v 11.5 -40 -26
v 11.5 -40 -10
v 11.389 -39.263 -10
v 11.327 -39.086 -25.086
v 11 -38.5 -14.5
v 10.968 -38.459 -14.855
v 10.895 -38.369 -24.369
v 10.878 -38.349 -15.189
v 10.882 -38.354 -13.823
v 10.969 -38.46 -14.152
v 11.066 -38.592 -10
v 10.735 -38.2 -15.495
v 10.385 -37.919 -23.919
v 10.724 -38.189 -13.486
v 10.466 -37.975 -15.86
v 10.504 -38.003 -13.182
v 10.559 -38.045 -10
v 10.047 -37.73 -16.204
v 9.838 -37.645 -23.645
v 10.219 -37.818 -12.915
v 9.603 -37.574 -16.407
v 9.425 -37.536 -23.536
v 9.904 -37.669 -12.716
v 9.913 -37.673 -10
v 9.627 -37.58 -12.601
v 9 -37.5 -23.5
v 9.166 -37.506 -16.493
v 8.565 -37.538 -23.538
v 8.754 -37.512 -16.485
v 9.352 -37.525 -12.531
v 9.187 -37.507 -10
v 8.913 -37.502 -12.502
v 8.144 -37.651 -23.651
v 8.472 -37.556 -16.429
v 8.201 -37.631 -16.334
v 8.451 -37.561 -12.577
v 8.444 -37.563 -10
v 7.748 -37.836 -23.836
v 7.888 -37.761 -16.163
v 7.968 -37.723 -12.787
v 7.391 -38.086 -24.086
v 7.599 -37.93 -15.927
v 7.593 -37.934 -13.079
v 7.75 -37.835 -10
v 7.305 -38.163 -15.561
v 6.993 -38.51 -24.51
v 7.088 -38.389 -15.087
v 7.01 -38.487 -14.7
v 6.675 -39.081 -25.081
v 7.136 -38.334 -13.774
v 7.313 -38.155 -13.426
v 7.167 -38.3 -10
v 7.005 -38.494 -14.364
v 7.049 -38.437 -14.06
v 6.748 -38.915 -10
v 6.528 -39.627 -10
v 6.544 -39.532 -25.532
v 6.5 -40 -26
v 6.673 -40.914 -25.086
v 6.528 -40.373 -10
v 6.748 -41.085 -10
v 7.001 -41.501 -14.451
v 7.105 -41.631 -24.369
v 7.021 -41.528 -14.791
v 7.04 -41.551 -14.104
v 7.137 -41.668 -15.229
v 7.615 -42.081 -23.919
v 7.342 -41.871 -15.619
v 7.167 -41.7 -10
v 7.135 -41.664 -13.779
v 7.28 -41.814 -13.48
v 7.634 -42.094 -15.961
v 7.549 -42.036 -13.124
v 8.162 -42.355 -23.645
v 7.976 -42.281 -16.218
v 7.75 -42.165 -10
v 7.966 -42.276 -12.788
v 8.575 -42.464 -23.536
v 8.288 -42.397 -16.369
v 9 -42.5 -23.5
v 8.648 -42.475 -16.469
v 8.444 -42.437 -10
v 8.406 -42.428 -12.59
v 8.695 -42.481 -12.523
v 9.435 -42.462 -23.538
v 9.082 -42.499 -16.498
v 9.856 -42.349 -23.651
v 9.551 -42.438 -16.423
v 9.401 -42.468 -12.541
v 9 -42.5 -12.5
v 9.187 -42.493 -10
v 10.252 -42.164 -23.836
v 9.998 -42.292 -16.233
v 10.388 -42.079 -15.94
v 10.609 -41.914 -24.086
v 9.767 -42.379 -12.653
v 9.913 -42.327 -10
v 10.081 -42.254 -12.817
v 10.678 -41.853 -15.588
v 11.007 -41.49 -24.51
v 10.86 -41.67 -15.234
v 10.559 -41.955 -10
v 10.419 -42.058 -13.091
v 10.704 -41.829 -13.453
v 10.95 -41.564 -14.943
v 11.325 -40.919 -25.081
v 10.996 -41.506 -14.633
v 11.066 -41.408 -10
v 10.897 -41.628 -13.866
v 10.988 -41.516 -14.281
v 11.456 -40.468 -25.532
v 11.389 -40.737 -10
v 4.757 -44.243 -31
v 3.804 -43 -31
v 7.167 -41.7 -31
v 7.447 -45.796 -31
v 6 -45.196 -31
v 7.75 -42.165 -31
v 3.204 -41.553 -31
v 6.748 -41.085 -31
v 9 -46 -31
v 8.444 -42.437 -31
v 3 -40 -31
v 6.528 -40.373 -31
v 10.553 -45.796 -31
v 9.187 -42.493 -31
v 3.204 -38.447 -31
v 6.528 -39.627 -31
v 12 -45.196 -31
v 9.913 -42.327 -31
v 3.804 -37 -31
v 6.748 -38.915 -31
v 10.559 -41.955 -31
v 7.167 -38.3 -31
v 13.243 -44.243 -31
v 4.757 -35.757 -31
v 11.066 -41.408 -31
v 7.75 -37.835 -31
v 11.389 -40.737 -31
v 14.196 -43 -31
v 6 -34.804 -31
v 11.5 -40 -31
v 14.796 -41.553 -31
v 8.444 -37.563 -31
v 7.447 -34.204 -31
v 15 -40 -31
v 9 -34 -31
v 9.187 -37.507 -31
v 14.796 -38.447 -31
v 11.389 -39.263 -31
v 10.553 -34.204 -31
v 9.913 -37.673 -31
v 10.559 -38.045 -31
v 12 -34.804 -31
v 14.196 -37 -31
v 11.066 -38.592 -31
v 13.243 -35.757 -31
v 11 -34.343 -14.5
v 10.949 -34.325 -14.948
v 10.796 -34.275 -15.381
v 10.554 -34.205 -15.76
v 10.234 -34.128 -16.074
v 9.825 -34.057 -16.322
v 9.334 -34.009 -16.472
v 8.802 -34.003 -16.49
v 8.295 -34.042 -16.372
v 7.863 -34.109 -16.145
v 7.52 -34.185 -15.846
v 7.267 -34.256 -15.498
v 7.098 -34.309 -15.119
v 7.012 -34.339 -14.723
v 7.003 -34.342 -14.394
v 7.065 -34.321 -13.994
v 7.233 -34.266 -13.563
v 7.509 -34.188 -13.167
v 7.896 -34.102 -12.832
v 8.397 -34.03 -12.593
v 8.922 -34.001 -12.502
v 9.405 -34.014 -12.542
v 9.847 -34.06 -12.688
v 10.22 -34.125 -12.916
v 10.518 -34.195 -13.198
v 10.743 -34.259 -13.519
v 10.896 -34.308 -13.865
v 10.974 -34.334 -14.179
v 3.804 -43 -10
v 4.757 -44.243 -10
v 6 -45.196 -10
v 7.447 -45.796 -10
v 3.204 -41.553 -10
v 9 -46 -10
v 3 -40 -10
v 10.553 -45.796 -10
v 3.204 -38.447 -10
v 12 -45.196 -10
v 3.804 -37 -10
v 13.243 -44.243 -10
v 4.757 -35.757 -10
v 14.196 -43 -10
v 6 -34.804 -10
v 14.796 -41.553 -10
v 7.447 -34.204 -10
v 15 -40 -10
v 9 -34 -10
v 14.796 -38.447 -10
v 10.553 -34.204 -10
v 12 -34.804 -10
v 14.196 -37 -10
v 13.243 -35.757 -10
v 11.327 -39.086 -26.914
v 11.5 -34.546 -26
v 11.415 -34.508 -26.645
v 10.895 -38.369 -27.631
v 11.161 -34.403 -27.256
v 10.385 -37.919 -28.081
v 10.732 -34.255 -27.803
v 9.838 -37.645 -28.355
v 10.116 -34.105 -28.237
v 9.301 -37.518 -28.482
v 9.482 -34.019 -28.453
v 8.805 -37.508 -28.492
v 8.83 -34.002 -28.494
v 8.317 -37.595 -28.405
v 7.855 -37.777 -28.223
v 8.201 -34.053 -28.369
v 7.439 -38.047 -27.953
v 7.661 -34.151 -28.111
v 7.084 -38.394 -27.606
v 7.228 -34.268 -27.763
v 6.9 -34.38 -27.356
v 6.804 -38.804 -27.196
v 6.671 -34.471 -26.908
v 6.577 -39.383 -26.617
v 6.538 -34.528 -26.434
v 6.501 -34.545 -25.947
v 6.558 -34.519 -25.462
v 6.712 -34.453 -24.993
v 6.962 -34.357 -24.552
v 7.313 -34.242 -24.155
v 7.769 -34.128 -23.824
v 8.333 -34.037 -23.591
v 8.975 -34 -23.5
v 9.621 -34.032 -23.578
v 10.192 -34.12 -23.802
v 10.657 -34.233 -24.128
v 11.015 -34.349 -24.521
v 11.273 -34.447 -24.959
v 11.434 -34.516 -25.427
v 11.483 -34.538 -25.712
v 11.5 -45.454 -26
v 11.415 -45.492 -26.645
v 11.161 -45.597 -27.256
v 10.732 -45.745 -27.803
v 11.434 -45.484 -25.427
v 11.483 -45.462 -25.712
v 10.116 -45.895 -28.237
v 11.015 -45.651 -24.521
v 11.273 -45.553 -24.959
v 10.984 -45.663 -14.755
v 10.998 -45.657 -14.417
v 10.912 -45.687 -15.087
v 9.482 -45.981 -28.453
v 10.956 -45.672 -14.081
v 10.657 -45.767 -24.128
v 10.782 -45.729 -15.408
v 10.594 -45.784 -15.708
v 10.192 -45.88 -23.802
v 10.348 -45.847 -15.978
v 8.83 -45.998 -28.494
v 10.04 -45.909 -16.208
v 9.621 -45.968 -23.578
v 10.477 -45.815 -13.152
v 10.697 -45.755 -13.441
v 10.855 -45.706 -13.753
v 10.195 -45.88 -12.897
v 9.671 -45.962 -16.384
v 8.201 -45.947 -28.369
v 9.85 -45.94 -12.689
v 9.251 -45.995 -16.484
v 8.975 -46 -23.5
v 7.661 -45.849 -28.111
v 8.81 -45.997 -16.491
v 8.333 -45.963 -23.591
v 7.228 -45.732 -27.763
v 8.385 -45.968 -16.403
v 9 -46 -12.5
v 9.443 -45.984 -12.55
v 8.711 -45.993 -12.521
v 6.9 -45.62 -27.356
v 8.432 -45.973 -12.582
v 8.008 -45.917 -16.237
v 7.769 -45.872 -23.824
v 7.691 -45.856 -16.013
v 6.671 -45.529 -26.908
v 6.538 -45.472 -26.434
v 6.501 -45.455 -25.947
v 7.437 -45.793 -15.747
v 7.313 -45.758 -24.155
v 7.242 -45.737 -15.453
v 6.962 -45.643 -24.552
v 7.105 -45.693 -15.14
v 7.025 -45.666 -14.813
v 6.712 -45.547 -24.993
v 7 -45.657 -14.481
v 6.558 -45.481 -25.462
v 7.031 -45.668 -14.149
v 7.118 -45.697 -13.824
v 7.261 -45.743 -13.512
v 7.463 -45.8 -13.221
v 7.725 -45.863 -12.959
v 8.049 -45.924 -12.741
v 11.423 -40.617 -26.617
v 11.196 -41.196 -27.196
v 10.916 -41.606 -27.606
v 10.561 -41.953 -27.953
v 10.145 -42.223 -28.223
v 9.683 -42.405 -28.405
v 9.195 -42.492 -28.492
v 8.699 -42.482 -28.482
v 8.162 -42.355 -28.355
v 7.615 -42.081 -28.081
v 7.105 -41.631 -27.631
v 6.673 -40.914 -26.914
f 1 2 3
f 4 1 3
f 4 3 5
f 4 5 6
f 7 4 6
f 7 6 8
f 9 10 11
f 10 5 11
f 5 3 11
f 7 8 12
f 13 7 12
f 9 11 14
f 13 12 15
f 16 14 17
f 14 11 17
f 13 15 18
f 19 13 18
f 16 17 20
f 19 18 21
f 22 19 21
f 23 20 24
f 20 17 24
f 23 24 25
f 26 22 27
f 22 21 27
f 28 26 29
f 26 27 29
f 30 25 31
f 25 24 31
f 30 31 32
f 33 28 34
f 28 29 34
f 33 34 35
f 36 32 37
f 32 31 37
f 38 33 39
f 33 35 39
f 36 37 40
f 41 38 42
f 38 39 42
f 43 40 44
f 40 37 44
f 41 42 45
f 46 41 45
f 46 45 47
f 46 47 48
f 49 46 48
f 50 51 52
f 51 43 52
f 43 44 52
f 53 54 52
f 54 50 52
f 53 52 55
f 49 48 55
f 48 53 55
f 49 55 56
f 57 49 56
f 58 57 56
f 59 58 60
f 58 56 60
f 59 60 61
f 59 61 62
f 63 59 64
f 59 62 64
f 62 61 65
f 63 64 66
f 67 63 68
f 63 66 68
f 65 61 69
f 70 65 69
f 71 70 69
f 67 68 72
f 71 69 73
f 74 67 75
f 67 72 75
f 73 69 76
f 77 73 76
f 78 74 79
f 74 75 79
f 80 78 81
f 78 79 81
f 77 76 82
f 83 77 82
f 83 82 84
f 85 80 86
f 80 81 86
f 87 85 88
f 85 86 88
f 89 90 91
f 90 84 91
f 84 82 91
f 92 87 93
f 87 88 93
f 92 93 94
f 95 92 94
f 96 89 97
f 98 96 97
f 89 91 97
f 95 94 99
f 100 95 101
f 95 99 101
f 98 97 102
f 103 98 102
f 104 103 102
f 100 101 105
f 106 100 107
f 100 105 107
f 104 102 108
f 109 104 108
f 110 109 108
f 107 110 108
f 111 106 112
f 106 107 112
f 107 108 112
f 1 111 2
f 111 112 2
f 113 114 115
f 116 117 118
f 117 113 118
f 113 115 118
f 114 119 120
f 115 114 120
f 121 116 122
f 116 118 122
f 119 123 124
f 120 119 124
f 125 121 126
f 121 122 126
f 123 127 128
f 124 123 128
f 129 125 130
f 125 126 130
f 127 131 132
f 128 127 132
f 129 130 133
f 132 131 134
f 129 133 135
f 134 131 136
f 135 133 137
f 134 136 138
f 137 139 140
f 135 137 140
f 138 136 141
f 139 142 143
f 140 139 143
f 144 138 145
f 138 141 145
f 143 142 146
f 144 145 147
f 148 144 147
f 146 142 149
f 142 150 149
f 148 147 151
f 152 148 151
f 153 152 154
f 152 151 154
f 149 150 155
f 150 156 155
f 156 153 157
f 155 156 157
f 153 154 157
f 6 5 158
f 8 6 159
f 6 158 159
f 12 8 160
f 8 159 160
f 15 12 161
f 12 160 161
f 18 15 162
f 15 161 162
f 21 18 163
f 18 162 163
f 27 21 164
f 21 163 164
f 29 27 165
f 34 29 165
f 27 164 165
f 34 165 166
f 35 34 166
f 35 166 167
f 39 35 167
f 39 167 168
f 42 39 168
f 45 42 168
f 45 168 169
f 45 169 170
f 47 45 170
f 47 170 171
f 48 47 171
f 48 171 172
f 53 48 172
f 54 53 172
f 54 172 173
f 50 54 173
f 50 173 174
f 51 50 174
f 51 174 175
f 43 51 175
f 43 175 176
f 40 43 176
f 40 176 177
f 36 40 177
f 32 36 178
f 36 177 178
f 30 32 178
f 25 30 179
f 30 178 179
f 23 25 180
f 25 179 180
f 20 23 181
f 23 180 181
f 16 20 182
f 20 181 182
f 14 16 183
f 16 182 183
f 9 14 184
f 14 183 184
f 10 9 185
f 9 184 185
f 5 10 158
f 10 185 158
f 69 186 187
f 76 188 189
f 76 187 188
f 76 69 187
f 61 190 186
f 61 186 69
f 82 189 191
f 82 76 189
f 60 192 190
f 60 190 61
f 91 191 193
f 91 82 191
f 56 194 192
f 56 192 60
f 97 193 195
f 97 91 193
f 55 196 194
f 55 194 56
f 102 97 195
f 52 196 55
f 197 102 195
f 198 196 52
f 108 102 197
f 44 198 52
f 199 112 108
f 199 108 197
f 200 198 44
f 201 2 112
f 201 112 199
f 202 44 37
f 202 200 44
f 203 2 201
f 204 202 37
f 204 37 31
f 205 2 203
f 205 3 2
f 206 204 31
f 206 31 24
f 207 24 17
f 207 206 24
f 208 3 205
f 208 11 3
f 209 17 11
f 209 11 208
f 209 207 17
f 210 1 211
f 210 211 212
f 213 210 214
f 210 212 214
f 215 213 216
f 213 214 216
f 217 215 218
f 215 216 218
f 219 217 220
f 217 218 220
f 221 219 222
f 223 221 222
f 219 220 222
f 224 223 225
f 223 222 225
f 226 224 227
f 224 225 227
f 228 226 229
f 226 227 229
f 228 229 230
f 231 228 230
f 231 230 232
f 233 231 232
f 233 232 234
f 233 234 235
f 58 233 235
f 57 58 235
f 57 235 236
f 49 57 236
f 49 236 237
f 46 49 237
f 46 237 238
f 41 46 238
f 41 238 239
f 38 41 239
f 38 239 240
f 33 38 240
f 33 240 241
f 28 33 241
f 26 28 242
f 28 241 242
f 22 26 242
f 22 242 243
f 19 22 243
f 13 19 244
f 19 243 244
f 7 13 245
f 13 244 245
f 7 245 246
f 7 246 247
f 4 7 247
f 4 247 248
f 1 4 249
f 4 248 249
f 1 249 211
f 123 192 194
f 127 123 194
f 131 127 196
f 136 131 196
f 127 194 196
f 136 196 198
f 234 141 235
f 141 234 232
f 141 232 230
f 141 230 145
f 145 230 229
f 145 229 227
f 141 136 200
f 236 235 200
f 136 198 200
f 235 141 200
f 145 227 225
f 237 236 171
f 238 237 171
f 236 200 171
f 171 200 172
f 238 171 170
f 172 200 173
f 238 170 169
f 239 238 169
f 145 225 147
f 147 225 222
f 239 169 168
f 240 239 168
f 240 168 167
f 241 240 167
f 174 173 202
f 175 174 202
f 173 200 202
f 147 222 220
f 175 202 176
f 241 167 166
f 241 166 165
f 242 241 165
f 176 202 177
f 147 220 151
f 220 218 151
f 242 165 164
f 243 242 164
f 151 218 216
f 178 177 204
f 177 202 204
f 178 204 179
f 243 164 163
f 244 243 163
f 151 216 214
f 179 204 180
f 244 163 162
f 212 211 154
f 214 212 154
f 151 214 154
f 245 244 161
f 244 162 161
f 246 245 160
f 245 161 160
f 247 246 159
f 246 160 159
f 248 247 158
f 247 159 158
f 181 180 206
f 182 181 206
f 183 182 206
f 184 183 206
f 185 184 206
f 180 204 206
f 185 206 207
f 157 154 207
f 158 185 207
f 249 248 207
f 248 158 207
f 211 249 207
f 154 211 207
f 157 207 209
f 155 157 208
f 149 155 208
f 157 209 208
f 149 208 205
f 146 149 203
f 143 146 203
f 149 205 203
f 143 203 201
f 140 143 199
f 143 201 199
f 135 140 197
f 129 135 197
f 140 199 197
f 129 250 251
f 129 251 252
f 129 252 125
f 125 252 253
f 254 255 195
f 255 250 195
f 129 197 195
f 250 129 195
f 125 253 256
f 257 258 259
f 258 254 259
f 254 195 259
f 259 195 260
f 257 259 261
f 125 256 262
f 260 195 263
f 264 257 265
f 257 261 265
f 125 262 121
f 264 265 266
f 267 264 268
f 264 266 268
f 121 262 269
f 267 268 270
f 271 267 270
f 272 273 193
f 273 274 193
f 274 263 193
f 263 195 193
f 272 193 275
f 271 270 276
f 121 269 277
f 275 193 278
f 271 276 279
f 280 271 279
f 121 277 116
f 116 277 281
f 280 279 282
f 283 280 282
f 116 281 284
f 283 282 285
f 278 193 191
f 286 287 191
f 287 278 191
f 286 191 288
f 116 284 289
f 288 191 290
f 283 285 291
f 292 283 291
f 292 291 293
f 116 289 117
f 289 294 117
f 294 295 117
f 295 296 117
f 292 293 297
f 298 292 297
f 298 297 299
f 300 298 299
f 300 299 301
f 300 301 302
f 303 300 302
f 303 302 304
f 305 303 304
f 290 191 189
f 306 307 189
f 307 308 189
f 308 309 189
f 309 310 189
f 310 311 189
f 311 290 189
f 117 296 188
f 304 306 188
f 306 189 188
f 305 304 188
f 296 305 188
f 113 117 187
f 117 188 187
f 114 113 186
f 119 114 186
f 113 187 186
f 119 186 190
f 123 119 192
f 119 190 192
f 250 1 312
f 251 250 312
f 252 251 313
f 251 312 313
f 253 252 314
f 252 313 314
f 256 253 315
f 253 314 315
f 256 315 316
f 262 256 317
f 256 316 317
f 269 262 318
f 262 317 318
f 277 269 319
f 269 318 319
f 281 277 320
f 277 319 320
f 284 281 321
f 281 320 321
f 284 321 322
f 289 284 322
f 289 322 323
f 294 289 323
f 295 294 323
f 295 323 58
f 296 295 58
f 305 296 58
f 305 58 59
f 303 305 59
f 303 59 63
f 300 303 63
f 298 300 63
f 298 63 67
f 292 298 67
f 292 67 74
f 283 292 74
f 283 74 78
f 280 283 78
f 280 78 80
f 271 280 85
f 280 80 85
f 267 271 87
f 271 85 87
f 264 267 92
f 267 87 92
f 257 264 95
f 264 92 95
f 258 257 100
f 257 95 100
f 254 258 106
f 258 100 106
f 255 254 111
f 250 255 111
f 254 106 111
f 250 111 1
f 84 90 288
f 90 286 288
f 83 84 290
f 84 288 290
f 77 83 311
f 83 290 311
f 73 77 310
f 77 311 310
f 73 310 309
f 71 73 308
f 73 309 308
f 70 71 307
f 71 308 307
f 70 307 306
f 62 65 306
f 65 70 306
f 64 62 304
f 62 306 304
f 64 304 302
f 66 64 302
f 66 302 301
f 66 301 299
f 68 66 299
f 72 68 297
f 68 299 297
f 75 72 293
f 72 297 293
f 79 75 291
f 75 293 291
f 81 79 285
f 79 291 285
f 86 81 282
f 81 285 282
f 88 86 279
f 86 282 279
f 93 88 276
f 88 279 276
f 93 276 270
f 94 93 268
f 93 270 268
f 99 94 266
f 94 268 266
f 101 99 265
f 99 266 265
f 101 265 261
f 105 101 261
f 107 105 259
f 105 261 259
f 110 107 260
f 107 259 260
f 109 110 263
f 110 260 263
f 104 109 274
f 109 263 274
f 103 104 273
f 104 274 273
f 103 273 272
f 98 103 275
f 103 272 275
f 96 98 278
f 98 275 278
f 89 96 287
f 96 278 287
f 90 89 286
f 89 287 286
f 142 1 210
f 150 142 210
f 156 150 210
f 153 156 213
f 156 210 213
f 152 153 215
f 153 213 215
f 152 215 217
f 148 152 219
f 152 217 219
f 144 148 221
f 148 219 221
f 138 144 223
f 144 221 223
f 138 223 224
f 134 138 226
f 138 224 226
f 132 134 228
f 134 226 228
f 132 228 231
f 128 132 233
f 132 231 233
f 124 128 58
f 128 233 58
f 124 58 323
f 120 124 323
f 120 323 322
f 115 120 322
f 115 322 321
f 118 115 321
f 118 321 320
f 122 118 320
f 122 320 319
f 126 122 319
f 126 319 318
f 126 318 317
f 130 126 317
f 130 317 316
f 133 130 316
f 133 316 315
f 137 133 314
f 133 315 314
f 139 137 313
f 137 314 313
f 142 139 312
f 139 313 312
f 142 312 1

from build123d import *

# Parameters (mm, degrees)
SKETCH_1_W                = 6
SKETCH_1_H                = 21
HOLE_WIZARD_5_0_5_1_D     = 5
HOLE_WIZARD_5_0_5_2_D     = 5
HOLE_WIZARD_5_0_5_2_DEPTH = 18
SKETCH_5_W                = 2
SKETCH_5_H                = 4.5
HOLE_WIZARD_4_0_4_2_D     = 4


with BuildPart() as part:
    # 草图1 → 旋转1 (revolve)
    with BuildSketch(Plane.XZ.offset(40), mode=Mode.PRIVATE) as revolve_1_sk:
        with Locations((12, -20.5)):
            Rectangle(SKETCH_1_W, SKETCH_1_H)
    revolve(revolve_1_sk.sketch.rotate(Axis((9, -40, -10), (0, 0, -1)), 180), axis=Axis((9, -40, -10), (0, 0, -1)))

    # Ø5.0 (5) 直径孔1 (through all)
    with Locations(Plane(origin=(0, 0, -31), x_dir=(-1, 0, 0), z_dir=(0, 0, -1))):
        with Locations((-9, -40)):
            Hole(HOLE_WIZARD_5_0_5_1_D / 2)

    # Ø5.0 (5) 直径孔2
    with Locations(Plane(origin=(9, -46, -26), x_dir=(-1, 0, 0), z_dir=(0, -1, 0))):
        with Locations((0, 0)):
            Hole(HOLE_WIZARD_5_0_5_2_D / 2, depth=HOLE_WIZARD_5_0_5_2_DEPTH)

    # 草图5 → Ø4.0 (4) 直径孔1 (revolve, cut)
    with BuildSketch(Plane(origin=(9, -41.5, -14.5), x_dir=(0, 0, 1), z_dir=(1, 0, 0))):
        with Locations((1, 2.25)):
            Rectangle(SKETCH_5_W, SKETCH_5_H)
    revolve(axis=Axis((9, -35.15, -14.5), (0, -1, 0)), mode=Mode.SUBTRACT)

    # Ø4.0 (4) 直径孔2 (through all)
    with Locations(Plane(origin=(0, -38.5, 0), x_dir=(-1, 0, 0), z_dir=(0, -1, 0))):
        with Locations((-9, 14.5)):
            Hole(HOLE_WIZARD_4_0_4_2_D / 2)


solid = part.part
